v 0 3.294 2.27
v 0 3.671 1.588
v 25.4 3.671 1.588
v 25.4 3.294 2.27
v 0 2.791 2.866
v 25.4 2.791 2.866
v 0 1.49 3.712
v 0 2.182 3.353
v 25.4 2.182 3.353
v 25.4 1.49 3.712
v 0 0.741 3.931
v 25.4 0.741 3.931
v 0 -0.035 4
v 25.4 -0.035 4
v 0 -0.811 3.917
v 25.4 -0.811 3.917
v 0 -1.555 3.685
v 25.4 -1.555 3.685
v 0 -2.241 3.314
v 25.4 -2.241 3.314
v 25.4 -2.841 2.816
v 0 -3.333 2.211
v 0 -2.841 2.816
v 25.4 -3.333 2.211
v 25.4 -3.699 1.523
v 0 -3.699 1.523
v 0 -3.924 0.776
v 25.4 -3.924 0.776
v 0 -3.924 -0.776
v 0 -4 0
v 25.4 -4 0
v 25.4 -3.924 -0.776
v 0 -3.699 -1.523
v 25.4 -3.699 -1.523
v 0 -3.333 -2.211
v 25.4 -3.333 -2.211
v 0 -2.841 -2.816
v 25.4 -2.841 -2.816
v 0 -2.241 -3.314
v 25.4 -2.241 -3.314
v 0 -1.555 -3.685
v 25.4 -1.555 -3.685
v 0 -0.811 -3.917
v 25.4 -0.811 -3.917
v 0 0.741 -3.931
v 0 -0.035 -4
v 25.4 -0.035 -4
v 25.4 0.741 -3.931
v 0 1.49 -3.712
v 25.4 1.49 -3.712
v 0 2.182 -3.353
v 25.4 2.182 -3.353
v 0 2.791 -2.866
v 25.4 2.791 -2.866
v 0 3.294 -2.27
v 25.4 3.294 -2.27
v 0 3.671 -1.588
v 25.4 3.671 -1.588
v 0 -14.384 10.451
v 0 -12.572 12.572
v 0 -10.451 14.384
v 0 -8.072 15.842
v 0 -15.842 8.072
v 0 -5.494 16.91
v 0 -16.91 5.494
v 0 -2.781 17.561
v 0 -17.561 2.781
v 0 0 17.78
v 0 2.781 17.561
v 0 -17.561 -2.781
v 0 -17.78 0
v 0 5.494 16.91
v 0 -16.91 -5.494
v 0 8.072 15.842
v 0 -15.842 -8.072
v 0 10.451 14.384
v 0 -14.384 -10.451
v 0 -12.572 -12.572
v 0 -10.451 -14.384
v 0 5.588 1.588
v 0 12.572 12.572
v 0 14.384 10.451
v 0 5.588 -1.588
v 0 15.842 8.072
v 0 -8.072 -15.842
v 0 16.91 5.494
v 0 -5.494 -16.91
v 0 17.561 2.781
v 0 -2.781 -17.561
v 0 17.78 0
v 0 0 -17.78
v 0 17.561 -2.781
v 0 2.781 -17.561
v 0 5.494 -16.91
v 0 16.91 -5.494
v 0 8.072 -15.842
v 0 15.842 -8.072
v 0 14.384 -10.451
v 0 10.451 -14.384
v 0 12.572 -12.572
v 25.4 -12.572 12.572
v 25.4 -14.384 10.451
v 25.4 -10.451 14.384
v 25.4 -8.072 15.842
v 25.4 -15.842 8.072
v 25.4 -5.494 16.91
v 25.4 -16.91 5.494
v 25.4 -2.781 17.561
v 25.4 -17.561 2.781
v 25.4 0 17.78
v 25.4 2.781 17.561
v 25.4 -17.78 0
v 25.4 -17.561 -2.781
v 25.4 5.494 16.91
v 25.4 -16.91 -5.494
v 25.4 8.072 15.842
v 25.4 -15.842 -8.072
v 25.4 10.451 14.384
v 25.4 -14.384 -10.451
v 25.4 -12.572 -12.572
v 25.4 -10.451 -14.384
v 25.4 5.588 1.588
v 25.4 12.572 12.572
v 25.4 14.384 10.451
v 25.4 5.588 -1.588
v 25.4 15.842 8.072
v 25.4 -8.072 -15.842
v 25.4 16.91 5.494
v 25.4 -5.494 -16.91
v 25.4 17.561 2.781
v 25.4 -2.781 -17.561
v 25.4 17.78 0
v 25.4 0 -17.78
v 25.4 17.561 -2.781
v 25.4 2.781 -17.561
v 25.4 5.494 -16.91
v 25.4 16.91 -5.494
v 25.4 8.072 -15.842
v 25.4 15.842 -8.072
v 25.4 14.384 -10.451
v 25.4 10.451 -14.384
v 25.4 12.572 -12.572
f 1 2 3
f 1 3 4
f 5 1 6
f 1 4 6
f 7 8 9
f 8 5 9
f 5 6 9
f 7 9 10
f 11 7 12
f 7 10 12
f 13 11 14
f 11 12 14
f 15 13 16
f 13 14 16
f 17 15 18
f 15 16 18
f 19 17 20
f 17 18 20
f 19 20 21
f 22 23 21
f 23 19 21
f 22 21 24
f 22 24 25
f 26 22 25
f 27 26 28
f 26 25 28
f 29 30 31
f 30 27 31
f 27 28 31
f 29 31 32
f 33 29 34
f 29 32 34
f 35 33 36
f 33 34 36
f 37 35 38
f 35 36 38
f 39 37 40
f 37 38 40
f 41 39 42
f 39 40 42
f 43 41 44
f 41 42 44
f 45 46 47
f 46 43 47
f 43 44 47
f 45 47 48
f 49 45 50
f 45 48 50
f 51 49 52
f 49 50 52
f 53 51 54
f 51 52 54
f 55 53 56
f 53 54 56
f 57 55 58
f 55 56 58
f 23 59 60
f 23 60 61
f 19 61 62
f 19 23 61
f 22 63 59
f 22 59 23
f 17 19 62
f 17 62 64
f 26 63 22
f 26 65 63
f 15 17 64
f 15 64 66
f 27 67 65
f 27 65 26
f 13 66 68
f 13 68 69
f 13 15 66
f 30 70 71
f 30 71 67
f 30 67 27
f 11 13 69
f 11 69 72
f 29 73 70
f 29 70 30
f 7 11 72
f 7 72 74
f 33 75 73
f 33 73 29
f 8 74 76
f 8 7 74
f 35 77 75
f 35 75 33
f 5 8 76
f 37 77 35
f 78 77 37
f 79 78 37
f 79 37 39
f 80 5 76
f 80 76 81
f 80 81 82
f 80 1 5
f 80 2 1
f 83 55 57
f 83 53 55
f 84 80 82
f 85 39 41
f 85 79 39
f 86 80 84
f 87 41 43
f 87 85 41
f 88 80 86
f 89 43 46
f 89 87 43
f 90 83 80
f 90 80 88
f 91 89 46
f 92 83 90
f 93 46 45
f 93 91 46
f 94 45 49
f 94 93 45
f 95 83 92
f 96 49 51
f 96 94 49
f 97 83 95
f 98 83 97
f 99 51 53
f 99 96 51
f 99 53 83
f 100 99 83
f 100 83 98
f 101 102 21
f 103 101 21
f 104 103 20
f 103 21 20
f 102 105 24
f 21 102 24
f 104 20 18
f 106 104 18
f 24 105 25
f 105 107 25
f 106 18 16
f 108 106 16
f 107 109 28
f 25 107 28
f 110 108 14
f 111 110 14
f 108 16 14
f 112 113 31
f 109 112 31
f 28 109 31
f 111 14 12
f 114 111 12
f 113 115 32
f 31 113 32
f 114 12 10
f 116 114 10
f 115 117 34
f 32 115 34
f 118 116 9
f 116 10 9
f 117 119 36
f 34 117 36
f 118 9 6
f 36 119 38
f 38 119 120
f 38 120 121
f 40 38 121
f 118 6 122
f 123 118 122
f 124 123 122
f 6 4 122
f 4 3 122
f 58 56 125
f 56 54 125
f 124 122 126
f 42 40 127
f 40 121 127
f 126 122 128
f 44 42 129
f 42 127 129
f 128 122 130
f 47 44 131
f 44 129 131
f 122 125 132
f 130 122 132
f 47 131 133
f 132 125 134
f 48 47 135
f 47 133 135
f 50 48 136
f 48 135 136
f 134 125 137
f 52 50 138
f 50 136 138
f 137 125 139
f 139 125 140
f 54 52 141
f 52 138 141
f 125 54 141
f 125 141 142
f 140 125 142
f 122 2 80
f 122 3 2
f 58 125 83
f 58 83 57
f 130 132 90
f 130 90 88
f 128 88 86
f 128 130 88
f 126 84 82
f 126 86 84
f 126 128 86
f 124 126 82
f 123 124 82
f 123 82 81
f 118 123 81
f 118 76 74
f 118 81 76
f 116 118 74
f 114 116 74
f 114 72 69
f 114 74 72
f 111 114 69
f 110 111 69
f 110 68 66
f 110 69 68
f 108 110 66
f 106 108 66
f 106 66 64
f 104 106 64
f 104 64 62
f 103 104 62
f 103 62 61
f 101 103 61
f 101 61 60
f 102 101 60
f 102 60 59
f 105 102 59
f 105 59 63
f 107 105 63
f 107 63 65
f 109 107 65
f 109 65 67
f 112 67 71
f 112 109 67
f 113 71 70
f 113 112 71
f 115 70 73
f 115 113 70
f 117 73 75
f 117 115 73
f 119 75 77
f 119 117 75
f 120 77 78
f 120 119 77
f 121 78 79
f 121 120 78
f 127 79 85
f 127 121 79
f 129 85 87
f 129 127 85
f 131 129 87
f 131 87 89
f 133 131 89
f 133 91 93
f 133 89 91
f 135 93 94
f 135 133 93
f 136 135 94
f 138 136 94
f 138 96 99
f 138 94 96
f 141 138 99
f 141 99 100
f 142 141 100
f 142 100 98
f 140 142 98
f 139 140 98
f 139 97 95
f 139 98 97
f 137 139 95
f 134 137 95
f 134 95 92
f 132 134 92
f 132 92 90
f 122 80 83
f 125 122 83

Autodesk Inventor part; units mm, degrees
ref_plane "YZ Plane" through (0, 0, 0) normal (1, 0, 0) x (0, 1, 0)
ref_plane "XZ Plane" through (0, 0, 0) normal (0, 1, 0) x (-1, 0, 0)
ref_plane "XY Plane" through (0, 0, 0) normal (0, 0, 1) x (1, 0, 0)
sketch "Sketch1" plane through (0, 0, 0) normal (0, 0, 1) x (1, 0, 0)
  line L0 (0, 0) -> (0, 17.78)
  line L1 (0, 17.78) -> (25.4, 17.78)
  line L2 (25.4, 17.78) -> (25.4, 0)
  line L3 (25.4, 0) -> (0, 0)
  line L4 (0, 4) -> (25.4, 4)
  dimension "d0" = 17.78
  dimension "d1" = 25.4
  dimension "d2" = 4
revolve "Revolution1" add sketch "Sketch1" angle 360 about axis through (25.4, 0, 0) along (-1, 0, 0) contours L0 L1 L2 L4
sketch "Sketch2" plane through (25.4, 0, 0) normal (1, 0, 0) x (0, 0, -1)
  line L0 (-1.5875, 5.5875) -> (1.5875, 5.5875)
  line L1 (1.5875, 5.5875) -> (1.5875, 2.4125)
  line L2 (1.5875, 2.4125) -> (-1.5875, 2.4125)
  line L3 (-1.5875, 2.4125) -> (-1.5875, 5.5875)
  circle A0 centre (0, 0) radius 4 projected
  line L4 (-1.5875, 5.5875) -> (1.5875, 2.4125) construction
  line L5 (1.5875, 5.5875) -> (-1.5875, 2.4125) construction
  point P0 (0, 4)
  dimension "d4" = 3.175
  dimension "d5" = 3.175
extrude "Extrusion1" cut sketch "Sketch2" against normal through all contours L0 L1 A0 L3 | A0 L1 L2 L3 picked at (0, 2.9417)
properties part number "SpacerB"
